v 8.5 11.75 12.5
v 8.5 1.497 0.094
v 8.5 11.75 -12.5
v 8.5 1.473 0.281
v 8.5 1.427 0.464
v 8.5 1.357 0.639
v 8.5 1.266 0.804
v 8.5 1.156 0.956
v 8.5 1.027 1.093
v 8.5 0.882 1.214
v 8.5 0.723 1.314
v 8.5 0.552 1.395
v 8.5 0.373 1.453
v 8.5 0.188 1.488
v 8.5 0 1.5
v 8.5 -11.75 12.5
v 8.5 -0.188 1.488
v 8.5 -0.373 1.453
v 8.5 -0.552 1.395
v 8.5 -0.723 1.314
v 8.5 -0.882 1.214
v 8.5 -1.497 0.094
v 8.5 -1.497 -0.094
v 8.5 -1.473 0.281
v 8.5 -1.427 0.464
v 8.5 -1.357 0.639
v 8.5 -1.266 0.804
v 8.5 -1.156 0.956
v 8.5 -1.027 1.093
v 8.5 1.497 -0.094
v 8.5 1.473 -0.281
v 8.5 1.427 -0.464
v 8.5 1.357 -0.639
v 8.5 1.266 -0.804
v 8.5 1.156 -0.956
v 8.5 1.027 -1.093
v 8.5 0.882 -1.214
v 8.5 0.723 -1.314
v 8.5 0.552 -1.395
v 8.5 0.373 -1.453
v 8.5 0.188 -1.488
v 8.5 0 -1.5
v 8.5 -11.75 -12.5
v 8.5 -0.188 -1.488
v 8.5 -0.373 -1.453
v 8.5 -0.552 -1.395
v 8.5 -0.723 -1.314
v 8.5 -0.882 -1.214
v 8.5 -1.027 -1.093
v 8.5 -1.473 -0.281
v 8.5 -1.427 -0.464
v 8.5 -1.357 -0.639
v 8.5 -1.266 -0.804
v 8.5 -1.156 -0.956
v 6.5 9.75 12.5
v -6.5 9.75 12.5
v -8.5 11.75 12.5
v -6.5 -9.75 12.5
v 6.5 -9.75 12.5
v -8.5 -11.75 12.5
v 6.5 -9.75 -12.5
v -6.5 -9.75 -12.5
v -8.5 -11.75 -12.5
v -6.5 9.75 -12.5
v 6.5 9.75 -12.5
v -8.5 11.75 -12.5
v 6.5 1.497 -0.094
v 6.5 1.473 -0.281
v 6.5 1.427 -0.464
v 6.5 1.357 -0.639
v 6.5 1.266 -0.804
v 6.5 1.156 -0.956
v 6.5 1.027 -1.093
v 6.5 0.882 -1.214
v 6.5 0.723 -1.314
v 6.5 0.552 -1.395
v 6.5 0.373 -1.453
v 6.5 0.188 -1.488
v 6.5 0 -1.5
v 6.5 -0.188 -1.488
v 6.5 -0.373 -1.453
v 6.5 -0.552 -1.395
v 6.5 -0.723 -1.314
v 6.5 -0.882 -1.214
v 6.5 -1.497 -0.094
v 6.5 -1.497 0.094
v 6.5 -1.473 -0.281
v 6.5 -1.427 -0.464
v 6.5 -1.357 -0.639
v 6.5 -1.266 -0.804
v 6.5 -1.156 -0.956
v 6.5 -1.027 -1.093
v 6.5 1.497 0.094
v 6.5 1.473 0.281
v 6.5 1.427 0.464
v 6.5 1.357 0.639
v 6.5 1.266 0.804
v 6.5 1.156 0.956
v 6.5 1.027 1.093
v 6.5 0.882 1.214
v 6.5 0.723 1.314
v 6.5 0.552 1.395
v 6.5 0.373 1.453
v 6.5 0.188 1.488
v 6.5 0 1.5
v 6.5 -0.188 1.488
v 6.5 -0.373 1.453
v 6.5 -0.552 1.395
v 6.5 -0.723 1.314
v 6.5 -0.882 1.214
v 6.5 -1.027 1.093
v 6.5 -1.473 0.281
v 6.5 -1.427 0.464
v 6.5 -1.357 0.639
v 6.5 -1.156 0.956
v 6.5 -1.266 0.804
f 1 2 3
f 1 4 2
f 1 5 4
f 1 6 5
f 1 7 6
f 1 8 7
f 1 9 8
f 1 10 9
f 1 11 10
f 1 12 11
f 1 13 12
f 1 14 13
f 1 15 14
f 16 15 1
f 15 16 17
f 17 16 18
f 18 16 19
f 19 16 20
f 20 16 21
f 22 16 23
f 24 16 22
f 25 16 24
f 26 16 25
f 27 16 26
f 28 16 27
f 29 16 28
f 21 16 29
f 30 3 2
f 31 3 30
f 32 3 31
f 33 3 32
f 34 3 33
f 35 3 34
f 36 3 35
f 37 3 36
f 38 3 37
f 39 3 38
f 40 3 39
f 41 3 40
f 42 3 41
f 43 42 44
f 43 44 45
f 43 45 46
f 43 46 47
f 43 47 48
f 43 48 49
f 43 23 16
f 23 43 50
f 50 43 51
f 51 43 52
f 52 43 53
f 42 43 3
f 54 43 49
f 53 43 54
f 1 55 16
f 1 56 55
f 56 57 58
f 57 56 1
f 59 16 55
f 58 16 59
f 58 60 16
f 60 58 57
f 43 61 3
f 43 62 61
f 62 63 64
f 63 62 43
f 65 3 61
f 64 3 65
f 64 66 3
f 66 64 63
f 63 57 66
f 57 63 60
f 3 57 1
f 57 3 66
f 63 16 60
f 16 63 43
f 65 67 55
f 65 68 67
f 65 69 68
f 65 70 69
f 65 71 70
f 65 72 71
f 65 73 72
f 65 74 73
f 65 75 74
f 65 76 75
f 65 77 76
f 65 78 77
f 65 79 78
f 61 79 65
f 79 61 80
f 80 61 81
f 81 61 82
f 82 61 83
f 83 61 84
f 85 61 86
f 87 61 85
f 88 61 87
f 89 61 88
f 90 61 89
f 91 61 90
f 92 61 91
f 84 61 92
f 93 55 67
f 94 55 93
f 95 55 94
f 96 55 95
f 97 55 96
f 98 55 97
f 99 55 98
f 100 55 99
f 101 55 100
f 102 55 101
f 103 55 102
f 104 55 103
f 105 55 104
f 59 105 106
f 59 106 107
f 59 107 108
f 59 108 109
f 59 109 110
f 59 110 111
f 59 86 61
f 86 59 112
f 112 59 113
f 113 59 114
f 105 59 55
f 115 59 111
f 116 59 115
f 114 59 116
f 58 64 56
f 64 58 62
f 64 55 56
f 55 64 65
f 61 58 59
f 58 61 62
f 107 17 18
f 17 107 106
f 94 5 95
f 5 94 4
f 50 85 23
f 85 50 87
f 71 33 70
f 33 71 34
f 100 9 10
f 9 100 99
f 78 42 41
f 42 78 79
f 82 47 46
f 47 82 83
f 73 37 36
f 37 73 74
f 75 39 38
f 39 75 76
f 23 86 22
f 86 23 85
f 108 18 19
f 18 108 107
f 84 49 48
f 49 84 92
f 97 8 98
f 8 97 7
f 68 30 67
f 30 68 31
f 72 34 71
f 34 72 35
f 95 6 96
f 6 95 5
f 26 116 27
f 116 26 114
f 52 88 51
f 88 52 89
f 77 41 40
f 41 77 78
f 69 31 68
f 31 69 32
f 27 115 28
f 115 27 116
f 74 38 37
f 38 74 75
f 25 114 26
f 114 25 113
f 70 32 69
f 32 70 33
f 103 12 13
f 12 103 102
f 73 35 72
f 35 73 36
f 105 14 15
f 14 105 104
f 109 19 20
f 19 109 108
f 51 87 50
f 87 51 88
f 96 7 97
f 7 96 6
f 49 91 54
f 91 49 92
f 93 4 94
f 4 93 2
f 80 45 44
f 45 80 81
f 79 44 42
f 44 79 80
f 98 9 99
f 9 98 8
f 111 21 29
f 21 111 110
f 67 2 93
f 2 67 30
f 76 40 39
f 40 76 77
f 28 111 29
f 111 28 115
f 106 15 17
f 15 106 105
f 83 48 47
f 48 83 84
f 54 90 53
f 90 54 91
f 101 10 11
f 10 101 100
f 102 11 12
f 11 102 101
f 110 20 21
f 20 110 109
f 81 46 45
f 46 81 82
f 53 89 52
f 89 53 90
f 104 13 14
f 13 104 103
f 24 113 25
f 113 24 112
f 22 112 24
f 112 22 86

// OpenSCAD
inside_x = 13;
inside_y = 19.5;
wall_thickness = 2;
length = 25;
screwhole_radius = 1.5;

$fn=50;

difference() {

cube(size=[inside_x+wall_thickness*2, inside_y+wall_thickness*2, length], center = true);

cube(size=[inside_x, inside_y, length+2], center = true);

rotate([0,90,0])
    cylinder(h=inside_x, r=screwhole_radius);

}
